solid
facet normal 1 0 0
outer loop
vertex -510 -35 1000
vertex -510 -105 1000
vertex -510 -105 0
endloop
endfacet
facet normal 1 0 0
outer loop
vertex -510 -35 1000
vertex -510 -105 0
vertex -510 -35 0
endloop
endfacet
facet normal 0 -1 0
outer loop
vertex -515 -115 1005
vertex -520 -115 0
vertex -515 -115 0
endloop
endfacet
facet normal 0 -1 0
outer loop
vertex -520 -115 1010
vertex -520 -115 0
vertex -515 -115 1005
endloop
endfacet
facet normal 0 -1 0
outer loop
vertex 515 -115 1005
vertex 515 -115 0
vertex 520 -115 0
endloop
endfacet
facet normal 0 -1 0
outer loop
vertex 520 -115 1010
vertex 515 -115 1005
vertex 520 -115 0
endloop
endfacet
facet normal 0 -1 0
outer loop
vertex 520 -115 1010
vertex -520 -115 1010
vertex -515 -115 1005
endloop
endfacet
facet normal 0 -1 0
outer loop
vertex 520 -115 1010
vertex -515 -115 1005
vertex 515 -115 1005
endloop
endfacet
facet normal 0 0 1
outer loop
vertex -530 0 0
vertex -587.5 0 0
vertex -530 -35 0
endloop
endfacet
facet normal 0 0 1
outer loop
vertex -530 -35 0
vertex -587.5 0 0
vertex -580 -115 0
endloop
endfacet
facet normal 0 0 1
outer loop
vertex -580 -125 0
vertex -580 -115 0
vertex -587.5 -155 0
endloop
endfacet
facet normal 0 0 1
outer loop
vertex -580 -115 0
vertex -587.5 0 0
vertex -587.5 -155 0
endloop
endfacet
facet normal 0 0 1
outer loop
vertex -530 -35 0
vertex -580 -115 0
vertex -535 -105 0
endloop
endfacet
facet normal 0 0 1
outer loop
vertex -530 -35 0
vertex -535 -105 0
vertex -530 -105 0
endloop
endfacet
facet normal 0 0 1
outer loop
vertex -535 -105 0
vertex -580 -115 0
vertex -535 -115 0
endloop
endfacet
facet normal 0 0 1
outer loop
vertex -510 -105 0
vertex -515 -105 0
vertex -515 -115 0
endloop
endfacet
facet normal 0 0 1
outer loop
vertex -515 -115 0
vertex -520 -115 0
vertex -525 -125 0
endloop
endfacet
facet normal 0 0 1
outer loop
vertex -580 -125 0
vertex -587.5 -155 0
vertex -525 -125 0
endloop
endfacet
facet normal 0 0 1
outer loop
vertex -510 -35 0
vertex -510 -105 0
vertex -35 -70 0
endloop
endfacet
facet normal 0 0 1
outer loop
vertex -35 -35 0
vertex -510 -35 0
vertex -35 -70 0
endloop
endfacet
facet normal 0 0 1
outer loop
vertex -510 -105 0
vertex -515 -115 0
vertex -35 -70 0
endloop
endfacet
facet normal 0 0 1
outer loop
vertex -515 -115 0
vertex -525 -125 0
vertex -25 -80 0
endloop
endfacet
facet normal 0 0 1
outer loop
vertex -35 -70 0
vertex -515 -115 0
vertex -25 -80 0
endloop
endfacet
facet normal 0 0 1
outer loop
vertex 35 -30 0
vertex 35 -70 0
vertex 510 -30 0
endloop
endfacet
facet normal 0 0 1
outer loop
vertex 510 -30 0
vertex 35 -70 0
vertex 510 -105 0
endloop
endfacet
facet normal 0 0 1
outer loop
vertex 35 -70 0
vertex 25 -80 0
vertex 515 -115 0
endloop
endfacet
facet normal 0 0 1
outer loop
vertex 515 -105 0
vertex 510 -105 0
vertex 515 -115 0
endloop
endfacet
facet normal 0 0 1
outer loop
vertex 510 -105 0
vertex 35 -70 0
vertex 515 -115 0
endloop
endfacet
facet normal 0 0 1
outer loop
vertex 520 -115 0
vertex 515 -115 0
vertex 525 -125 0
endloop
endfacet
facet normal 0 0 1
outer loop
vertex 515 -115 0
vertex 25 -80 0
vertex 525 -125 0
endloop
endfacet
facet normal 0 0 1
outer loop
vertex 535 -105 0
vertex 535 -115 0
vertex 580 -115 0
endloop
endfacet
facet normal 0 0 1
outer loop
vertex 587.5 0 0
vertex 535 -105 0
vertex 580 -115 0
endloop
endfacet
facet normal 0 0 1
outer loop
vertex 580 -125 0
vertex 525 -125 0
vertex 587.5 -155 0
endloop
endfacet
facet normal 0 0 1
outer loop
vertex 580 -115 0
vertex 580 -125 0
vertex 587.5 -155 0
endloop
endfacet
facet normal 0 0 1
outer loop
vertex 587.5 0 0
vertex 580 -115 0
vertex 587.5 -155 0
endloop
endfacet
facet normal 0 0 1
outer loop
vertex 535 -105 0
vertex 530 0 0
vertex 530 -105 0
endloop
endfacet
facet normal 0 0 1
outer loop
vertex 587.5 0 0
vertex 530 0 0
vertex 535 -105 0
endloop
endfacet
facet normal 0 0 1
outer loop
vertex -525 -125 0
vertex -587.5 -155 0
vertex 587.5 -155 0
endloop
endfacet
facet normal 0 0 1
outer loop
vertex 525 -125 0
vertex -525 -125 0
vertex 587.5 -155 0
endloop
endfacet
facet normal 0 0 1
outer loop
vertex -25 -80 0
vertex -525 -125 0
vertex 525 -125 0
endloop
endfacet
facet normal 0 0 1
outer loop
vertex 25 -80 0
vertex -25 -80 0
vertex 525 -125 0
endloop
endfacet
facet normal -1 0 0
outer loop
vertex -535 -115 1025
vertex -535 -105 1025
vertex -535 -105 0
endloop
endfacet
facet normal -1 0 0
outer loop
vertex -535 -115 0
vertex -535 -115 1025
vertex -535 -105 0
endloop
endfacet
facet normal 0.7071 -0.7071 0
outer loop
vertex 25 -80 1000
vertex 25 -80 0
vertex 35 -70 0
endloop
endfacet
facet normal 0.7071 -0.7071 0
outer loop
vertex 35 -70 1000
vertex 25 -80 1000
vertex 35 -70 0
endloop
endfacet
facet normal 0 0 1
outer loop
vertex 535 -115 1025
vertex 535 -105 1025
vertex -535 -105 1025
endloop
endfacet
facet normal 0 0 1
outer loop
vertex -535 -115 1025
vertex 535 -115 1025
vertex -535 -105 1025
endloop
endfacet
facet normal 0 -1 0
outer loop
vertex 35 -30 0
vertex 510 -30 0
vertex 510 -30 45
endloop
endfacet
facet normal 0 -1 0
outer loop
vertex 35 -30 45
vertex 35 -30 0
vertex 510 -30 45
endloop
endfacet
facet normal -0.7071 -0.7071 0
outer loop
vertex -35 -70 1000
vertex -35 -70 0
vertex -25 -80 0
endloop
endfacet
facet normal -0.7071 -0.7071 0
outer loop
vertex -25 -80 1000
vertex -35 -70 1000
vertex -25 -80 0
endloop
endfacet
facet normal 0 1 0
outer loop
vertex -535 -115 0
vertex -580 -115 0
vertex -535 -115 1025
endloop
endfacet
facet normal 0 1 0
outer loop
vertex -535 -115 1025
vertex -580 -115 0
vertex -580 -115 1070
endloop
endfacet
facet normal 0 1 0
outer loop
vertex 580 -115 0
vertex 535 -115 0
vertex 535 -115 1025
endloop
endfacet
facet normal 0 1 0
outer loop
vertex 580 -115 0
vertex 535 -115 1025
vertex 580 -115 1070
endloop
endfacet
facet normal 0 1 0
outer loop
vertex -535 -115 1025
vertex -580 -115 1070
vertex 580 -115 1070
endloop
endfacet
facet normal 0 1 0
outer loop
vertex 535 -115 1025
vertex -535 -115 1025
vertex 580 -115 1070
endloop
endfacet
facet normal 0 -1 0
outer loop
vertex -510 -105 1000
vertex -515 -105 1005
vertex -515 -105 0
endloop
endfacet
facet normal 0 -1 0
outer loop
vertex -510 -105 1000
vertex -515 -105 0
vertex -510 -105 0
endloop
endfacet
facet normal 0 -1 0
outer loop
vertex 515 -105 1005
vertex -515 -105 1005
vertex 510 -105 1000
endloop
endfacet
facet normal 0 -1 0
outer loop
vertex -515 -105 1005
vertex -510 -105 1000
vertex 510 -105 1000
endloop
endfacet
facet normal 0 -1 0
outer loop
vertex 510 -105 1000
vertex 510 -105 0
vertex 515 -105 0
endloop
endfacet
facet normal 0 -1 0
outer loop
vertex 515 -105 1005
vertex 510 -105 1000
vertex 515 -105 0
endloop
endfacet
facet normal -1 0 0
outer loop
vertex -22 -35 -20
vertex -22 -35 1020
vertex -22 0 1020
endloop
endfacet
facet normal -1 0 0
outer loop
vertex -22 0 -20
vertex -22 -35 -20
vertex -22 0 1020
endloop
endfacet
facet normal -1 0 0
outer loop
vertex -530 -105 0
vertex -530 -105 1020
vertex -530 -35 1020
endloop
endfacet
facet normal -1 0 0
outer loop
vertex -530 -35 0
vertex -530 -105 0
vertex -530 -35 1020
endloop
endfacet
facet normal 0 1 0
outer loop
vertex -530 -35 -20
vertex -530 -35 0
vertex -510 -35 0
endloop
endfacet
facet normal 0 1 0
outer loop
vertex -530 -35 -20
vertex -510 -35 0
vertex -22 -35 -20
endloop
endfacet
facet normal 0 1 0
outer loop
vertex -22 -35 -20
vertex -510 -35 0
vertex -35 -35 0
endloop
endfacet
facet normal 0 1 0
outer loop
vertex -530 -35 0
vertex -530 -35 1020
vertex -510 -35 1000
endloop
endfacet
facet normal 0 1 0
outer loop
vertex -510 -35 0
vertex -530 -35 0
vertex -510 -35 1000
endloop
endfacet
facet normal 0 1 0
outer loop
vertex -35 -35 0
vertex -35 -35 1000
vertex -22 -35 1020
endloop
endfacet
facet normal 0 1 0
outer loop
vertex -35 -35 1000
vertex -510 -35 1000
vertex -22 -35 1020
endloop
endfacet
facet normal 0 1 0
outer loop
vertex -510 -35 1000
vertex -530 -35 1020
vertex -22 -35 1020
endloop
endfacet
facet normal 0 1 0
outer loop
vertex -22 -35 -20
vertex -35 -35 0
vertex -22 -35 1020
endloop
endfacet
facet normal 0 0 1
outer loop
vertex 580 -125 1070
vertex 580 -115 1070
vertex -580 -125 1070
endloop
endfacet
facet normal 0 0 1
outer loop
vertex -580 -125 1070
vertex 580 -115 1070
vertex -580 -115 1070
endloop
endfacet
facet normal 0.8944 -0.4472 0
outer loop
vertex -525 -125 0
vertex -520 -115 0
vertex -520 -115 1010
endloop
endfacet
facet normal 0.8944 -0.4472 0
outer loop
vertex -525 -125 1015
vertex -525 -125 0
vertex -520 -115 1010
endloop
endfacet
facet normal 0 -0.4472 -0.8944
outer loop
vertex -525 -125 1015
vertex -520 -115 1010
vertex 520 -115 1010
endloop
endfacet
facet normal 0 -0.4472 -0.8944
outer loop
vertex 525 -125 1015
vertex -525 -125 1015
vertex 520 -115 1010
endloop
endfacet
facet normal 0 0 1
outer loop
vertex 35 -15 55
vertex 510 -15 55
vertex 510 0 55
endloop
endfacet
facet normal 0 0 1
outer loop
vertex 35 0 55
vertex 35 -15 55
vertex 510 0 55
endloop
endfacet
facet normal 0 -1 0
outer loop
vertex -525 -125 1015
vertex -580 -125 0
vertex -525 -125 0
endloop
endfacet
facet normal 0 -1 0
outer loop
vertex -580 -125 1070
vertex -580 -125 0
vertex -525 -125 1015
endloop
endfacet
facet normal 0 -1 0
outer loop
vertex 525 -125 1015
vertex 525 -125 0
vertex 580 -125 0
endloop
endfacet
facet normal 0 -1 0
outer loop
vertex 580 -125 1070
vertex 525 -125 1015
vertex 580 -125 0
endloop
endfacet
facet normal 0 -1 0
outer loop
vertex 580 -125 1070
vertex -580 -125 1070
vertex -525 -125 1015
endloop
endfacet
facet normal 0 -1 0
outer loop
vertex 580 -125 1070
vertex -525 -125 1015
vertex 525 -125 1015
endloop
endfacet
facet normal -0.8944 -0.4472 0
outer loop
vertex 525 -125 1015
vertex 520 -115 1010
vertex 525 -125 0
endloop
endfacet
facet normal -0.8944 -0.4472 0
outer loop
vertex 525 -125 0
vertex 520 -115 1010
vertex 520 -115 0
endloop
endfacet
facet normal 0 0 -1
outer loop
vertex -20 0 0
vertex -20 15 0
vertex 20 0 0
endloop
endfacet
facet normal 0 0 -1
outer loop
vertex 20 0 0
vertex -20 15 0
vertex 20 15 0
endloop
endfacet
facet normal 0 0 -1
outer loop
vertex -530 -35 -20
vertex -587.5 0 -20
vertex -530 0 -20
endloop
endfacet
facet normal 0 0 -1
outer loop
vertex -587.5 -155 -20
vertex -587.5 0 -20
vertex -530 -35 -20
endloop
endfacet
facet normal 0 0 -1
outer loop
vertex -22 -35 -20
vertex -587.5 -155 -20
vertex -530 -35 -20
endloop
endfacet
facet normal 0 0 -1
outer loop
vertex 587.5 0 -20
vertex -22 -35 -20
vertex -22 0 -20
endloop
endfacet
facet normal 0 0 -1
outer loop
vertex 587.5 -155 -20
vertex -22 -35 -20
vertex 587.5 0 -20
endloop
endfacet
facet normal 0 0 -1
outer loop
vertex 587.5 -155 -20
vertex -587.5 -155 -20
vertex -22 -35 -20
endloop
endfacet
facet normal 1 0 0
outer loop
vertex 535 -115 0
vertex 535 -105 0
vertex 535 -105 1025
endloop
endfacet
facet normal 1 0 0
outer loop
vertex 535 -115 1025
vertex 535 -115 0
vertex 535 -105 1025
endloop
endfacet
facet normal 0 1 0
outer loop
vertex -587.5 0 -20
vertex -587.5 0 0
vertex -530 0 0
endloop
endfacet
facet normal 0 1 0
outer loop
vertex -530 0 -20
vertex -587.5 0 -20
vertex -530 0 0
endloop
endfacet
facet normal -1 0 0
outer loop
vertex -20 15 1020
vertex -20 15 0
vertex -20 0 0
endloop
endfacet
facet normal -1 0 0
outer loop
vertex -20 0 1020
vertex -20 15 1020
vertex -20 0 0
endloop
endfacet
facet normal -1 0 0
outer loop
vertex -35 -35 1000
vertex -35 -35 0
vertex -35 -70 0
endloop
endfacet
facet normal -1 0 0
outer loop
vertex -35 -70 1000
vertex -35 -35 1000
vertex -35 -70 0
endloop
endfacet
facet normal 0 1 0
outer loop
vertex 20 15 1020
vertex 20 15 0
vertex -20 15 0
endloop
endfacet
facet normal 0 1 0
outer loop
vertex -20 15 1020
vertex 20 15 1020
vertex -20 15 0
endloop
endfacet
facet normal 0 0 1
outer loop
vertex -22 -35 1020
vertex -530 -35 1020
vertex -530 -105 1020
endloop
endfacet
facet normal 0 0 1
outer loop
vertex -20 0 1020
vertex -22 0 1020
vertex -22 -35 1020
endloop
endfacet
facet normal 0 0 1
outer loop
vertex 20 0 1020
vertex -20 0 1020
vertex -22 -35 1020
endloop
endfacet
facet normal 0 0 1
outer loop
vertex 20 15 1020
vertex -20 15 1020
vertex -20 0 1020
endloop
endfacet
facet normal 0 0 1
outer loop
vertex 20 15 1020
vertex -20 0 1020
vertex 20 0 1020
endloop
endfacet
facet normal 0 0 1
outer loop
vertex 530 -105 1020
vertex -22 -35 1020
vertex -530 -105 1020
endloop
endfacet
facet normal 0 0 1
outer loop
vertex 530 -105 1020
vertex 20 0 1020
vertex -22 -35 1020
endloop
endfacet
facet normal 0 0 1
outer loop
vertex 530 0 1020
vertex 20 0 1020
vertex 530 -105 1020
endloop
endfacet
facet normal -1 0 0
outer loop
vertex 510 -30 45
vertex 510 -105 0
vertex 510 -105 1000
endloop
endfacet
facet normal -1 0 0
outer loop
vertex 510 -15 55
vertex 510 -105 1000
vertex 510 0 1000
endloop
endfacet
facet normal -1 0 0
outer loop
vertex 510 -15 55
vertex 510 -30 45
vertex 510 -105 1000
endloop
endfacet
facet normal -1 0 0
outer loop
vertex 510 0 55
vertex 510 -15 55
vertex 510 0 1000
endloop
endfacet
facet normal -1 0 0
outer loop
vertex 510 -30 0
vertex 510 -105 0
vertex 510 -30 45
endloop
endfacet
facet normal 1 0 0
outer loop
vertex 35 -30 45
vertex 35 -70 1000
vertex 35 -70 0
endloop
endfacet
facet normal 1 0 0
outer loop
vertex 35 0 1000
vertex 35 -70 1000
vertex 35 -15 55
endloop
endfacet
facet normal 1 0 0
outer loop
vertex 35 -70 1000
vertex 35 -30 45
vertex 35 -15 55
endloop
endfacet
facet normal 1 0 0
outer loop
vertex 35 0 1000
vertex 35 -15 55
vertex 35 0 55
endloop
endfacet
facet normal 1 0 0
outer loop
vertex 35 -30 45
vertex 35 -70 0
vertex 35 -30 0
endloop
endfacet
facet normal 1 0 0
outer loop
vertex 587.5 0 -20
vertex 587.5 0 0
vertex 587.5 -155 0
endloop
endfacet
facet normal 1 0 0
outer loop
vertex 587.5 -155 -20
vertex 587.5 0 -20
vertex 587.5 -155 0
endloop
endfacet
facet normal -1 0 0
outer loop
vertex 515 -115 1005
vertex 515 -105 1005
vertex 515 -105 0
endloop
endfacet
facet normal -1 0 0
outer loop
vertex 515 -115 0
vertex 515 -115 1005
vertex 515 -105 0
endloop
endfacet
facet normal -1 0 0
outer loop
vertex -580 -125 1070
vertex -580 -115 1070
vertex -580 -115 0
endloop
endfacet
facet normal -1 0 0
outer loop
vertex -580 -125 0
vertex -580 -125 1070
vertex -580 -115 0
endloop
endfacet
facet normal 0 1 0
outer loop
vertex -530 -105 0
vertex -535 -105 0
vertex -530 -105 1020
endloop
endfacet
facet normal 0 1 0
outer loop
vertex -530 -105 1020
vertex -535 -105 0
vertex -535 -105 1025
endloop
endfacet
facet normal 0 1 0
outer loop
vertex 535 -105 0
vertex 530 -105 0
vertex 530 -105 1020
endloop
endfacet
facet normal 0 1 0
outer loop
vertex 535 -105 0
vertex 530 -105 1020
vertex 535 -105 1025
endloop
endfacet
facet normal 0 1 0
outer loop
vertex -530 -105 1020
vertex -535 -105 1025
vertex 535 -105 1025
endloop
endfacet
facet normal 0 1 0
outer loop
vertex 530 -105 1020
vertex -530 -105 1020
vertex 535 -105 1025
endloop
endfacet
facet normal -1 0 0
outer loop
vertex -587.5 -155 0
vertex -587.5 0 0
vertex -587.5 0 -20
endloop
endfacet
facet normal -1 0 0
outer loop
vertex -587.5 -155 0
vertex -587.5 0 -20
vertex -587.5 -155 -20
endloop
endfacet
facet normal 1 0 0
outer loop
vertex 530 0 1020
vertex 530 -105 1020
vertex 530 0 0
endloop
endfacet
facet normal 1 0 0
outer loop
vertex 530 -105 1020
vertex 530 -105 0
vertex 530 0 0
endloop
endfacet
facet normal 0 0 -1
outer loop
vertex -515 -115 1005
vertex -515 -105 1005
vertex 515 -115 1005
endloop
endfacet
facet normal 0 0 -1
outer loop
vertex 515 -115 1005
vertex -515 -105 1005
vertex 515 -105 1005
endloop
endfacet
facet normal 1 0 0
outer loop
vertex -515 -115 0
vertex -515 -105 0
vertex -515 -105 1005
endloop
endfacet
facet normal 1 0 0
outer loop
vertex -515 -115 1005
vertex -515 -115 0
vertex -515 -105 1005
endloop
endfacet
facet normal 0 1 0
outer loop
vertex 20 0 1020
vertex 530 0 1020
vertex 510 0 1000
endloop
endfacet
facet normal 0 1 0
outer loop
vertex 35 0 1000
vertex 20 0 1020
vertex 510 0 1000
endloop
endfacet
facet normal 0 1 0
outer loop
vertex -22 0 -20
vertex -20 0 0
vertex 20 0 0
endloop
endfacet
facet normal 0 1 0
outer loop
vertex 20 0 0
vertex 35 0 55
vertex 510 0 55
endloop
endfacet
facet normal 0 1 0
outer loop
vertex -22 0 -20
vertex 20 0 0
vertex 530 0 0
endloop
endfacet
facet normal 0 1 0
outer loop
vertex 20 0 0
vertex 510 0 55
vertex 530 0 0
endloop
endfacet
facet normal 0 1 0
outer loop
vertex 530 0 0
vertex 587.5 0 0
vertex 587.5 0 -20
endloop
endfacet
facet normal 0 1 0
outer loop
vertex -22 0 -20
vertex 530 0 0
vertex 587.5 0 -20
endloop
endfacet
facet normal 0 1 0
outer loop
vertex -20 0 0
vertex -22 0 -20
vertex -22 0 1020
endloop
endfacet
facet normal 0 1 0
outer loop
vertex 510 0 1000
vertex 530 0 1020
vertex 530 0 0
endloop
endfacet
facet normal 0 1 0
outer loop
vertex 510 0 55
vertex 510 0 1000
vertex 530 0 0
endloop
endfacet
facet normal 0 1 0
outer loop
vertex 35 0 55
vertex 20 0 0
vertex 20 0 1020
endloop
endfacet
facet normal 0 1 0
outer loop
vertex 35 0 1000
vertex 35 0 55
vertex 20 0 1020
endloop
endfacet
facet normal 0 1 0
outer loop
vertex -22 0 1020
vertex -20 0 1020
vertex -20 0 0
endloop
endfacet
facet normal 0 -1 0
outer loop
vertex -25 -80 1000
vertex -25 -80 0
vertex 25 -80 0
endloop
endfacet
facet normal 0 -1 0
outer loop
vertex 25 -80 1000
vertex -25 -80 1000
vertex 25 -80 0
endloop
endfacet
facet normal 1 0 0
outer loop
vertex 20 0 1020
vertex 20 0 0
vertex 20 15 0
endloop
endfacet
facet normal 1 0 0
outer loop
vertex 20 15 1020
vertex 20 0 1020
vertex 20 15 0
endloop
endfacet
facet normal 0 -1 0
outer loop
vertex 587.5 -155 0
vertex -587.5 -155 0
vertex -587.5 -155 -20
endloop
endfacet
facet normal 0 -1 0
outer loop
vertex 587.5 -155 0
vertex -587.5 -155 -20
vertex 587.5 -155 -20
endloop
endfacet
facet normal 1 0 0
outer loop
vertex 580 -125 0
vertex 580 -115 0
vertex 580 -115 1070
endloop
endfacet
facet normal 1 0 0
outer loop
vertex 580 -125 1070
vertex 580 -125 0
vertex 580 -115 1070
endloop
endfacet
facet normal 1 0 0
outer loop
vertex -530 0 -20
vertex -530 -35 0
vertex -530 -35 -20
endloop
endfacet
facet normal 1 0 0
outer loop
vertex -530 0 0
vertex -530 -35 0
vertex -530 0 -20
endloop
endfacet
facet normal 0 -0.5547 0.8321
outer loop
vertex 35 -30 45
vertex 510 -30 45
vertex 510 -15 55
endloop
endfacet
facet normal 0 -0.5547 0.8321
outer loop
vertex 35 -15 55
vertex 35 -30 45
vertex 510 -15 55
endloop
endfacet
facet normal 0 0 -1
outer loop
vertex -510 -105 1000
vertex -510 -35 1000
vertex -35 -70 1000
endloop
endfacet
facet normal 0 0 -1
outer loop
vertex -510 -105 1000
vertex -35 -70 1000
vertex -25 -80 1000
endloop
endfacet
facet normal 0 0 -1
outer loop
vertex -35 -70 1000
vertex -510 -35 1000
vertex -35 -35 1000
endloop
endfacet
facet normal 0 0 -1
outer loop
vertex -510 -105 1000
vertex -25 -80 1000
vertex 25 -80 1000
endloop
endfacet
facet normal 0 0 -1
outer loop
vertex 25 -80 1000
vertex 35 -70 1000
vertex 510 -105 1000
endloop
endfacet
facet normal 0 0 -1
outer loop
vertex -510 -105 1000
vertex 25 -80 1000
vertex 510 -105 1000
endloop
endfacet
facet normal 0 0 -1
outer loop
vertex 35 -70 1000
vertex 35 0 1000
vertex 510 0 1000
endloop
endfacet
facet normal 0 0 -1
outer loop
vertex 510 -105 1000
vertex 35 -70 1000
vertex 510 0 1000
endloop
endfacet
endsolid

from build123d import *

# Parameters (mm, degrees)
F0_W      = 20
F0_H      = 105
F1_DEPTH  = 1000
F2_W      = 1060
F2_H      = 105
F3_DEPTH  = 20
F4_W      = 1175
F4_H      = 155
F5_DEPTH  = 20
F7_W      = 508
F7_H      = 35
F8_DEPTH  = 1040
F9_DEPTH  = 475
F11_DEPTH = 10
F13_DEPTH = 1020
F15_DEPTH = 10
F16_SIZE2 = 9.99999
F16_SIZE  = 4.99999


# Not quite as in the source:
# - a fillet or chamfer is up to 0.001 mm smaller than in the source, because OpenCascade refuses the exact size


with BuildPart() as f1:
    # F0 (on Top) → F1 (new body)
    with BuildSketch(Plane.XY):
        with Locations((-520, -52.5)):
            Rectangle(F0_W, F0_H)
    extrude(amount=F1_DEPTH)



with BuildPart() as f1b:
    # F0 (on Top) → F1, piece 2 (new body)
    with BuildSketch(Plane.XY):
        with Locations((520, -52.5)):
            Rectangle(F0_W, F0_H)
    extrude(amount=F1_DEPTH)


with BuildPart() as f1c:
    # F0 (on Top) → F1, piece 3 (new body)
    with BuildSketch(Plane.XY):
        Polygon((35, 0), (0, 0), (-35, 0), (-35, -70), (-25, -80), (25, -80), (35, -70), align=None)
    extrude(amount=F1_DEPTH)


with BuildPart() as f1_1:
    add(f1.part)

    add(f1b.part)  # F3 merges F1b

    add(f1c.part)  # F3 merges F1c
    # F2 (on face) → F3 (join)
    with BuildSketch(Plane.XY.offset(1000)):
        with Locations((0, -52.5)):
            Rectangle(F2_W, F2_H)
    extrude(amount=F3_DEPTH)

    # F4 (on face) → F5 (join)
    with BuildSketch(Plane(origin=(0, 0, 0), x_dir=(1, 0, 0), z_dir=(0, 0, -1))):
        with Locations((0, 77.5)):
            Rectangle(F4_W, F4_H)
    extrude(amount=F5_DEPTH)

    # F7 (on face) → F8 (cut, through all)
    with BuildSketch(Plane.XY.offset(1020)):
        with Locations((-276, -17.5)):
            Rectangle(F7_W, F7_H)
    extrude(amount=-F8_DEPTH, mode=Mode.SUBTRACT)

    # F6 (on face) → F9 (join, through all)
    with BuildSketch(Plane(origin=(510, 0, 0), x_dir=(0, -1, 0), z_dir=(-1, 0, 0))):
        Polygon((0, 55), (0, 0), (30, 0), (30, 45), (15, 55), align=None)
    extrude(amount=F9_DEPTH)

    # F10 (on face) → F11 (join)
    with BuildSketch(Plane.XZ.offset(105)):
        Polygon((515, 1005), (515, 0), (535, 0), (535, 1025), (-535, 1025), (-535, 0), (-515, 0), (-515, 1005), align=None)
    extrude(amount=F11_DEPTH)

    # F12 (on Top) → F13 (join, through all)
    with BuildSketch(Plane.XY):
        Polygon((-20, 0), (0, 0), (20, 0), (20, 15), (-20, 15), align=None)
    extrude(amount=F13_DEPTH)

    # F14 (on face) → F15 (join)
    with BuildSketch(Plane.XZ.offset(115)):
        Polygon((520, 1010), (520, 0), (580, 0), (580, 1070), (-580, 1070), (-580, 0), (-520, 0), (-520, 1010), align=None)
    extrude(amount=F15_DEPTH)

    # F16 (size 5 and 10 in the source; OpenCascade refuses exactly that, so slightly less here)
    f16_edges = [f1_1.edges().sort_by_distance(p)[0] for p in [
        (-520, -125, 505),
        (0, -125, 1010),
        (520, -125, 505),
    ]]
    f16_side = f1_1.faces().sort_by_distance((535.781318, -125, 505))[0]
    chamfer(f16_edges, length=F16_SIZE, length2=F16_SIZE2, reference=f16_side)


solid = f1_1.part
